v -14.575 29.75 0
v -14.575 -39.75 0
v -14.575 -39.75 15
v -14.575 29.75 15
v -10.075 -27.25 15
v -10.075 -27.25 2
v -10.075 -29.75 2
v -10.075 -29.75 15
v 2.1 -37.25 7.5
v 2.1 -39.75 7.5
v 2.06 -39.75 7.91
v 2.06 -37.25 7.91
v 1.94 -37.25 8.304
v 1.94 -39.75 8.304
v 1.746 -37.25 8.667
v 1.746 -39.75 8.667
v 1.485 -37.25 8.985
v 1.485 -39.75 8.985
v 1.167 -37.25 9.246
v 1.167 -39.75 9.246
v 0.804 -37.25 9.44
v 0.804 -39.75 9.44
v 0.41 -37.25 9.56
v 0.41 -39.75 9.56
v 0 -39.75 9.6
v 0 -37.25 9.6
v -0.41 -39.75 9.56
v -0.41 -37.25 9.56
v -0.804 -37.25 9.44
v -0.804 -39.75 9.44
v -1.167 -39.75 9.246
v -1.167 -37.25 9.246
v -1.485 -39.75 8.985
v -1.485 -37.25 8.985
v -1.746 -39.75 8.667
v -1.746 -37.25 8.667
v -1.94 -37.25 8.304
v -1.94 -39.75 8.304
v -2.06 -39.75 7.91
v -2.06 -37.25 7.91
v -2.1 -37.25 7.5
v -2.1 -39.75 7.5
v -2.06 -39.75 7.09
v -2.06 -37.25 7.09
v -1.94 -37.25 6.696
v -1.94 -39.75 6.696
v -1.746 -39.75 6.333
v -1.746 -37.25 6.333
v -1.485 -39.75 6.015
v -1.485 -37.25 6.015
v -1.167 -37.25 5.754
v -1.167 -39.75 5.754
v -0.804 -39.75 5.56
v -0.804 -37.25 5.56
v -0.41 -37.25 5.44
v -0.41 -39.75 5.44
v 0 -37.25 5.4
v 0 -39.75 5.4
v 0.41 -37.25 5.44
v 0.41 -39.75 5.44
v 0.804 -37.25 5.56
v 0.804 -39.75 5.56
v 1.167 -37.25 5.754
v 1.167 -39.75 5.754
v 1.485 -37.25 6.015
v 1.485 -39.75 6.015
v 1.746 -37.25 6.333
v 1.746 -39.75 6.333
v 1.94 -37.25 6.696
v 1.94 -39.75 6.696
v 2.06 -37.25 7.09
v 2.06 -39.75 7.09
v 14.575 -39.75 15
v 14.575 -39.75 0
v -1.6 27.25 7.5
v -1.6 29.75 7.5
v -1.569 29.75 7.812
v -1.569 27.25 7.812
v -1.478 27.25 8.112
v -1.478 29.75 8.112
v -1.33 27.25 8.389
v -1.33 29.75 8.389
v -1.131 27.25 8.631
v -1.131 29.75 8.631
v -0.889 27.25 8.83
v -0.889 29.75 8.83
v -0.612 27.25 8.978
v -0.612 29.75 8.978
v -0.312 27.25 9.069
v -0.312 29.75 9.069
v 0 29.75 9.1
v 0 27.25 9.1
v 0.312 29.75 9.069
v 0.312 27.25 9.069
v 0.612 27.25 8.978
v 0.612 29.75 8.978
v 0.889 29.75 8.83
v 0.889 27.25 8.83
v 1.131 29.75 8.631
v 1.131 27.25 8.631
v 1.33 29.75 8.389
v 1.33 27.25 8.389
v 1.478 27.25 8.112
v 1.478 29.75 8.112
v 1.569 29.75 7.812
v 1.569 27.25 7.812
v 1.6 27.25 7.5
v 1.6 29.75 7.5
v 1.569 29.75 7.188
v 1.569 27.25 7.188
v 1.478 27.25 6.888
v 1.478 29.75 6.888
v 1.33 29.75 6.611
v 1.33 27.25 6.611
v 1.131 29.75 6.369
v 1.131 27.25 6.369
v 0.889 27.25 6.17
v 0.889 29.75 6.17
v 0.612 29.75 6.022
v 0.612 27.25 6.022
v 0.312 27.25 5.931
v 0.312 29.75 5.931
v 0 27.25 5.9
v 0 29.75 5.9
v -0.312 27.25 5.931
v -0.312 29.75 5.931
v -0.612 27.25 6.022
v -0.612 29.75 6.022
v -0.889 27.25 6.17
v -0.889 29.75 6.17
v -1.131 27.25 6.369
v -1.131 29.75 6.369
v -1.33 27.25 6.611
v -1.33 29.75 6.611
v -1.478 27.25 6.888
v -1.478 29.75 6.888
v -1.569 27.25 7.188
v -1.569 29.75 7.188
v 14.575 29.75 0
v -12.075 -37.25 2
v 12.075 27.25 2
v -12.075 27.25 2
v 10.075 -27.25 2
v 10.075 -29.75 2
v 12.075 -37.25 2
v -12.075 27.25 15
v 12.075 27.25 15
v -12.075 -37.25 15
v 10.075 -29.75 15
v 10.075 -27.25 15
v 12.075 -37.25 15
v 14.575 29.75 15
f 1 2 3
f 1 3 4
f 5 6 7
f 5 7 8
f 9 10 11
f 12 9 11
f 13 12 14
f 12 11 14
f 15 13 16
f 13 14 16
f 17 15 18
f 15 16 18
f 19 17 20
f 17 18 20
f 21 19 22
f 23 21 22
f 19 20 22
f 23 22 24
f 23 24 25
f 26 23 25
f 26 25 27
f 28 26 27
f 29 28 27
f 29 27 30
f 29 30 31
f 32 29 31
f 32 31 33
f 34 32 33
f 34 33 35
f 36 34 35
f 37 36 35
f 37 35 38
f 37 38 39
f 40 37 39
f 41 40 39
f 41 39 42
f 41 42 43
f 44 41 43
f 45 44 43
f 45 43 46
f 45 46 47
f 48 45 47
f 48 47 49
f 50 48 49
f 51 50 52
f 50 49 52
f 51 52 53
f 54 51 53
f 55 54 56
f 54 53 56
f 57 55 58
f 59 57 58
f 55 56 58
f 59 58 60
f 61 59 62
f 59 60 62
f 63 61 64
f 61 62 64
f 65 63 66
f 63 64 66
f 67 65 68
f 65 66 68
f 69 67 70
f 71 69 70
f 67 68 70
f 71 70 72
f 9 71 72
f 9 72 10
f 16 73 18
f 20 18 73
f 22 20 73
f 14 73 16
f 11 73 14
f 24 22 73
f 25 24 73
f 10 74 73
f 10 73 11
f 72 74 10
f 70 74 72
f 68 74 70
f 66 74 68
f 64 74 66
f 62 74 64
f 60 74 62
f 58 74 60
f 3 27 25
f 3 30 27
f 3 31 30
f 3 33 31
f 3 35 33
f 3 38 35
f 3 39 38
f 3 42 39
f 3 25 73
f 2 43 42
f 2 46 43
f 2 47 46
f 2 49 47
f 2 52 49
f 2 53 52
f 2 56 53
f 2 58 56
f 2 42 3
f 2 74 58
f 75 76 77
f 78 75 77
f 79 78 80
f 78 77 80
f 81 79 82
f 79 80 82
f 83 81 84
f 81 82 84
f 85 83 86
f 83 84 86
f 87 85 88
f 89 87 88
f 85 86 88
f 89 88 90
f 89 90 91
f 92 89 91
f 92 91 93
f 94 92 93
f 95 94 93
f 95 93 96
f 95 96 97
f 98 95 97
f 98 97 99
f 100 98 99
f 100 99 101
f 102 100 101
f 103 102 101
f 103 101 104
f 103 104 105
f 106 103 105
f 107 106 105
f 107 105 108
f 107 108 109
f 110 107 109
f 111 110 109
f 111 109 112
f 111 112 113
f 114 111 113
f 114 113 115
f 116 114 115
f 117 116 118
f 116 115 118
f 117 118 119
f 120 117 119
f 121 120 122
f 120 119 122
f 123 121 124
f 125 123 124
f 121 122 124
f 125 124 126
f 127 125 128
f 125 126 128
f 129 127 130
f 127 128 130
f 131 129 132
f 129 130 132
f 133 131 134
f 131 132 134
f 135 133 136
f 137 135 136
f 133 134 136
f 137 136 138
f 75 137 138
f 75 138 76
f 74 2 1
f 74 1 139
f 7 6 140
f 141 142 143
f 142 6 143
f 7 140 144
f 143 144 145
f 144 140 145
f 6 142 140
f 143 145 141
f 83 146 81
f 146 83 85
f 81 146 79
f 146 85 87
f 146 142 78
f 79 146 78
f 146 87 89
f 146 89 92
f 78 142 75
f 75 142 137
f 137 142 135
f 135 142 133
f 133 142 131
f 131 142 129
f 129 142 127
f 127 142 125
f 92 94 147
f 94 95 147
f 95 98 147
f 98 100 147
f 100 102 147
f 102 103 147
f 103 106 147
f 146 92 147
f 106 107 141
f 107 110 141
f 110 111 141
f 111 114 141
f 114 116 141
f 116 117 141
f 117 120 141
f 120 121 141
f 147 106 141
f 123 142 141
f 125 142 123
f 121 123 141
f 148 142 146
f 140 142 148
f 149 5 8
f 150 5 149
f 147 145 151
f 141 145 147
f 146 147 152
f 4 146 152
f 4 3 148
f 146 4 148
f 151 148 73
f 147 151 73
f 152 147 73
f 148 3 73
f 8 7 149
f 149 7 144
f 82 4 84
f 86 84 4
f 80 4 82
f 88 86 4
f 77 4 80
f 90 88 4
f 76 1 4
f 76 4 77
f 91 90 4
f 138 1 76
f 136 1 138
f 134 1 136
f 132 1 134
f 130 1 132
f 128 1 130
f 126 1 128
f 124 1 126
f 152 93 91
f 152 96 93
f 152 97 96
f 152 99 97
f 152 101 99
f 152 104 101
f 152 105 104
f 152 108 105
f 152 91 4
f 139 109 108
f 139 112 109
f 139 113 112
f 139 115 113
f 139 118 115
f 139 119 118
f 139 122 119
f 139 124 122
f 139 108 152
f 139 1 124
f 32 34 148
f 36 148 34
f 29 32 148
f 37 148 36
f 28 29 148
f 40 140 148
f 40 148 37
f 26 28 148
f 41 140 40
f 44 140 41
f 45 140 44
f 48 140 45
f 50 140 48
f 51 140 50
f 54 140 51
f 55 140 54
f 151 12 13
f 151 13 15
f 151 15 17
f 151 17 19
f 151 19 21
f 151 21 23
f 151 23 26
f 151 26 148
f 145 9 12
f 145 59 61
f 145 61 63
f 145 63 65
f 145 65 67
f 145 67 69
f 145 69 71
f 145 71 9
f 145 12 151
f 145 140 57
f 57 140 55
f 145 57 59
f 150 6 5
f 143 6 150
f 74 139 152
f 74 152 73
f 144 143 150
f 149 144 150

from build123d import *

# Parameters (mm, degrees)
F0_W      = 29.15
F0_H      = 59.5
F0_W_2    = 24.15
F0_H_2    = 54.5
F1_DEPTH  = 2
F2_DEPTH  = 15
F3_W      = 2
F3_H      = 13
F4_DEPTH  = 25
F6_DEPTH  = 15
F5_W      = 24.15
F5_H      = 7.5
F7_DEPTH  = 2
F8_R      = 2.1
F9_DEPTH  = 5
F10_R     = 1.6
F11_DEPTH = 25


with BuildPart() as f1:
    # F0 (on Top) → F1 (new body)
    with BuildSketch(Plane.XY):
        Rectangle(F0_W, F0_H)
        Rectangle(F0_W_2, F0_H_2, mode=Mode.SUBTRACT)
        Rectangle(F0_W_2, F0_H_2)
    extrude(amount=F1_DEPTH)

    # F0 (on Top) → F2 (join)
    with BuildSketch(Plane.XY):
        Rectangle(F0_W, F0_H)
        Rectangle(F0_W_2, F0_H_2, mode=Mode.SUBTRACT)
    extrude(amount=F2_DEPTH)

    # F3 (on face) → F4 (cut)
    with BuildSketch(Plane(origin=(0, -27.25, 0), x_dir=(-1, 0, 0), z_dir=(0, 1, 0))):
        with Locations((11.075, 8.5)):
            Rectangle(F3_W, F3_H)
        with Locations((-11.075, 8.5)):
            Rectangle(F3_W, F3_H)
    extrude(amount=-F4_DEPTH, mode=Mode.SUBTRACT)

    # F5 (on face) → F6 (join)
    with BuildSketch(Plane(origin=(0, 0, 0), x_dir=(1, 0, 0), z_dir=(0, 0, -1))):
        Polygon((-14.575, 39.75), (-14.575, 29.75), (-12.075, 29.75), (-12.075, 37.25), (12.075, 37.25), (12.075, 29.75), (14.575, 29.75), (14.575, 39.75), align=None)
    extrude(amount=-F6_DEPTH)

    # F5 (on face) → F7 (join)
    with BuildSketch(Plane(origin=(0, 0, 0), x_dir=(1, 0, 0), z_dir=(0, 0, -1))):
        with Locations((0, 33.5)):
            Rectangle(F5_W, F5_H)
    extrude(amount=-F7_DEPTH)

    # F8 (on face) → F9 (cut)
    with BuildSketch(Plane.XZ.offset(39.75)):
        with Locations((0, 7.5)):
            Circle(F8_R)
    extrude(amount=-F9_DEPTH, mode=Mode.SUBTRACT)

    # F10 (on face) → F11 (cut)
    with BuildSketch(Plane(origin=(0, 29.75, 0), x_dir=(-1, 0, 0), z_dir=(0, 1, 0))):
        with Locations((0, 7.5)):
            Circle(F10_R)
    extrude(amount=-F11_DEPTH, mode=Mode.SUBTRACT)


solid = f1.part
